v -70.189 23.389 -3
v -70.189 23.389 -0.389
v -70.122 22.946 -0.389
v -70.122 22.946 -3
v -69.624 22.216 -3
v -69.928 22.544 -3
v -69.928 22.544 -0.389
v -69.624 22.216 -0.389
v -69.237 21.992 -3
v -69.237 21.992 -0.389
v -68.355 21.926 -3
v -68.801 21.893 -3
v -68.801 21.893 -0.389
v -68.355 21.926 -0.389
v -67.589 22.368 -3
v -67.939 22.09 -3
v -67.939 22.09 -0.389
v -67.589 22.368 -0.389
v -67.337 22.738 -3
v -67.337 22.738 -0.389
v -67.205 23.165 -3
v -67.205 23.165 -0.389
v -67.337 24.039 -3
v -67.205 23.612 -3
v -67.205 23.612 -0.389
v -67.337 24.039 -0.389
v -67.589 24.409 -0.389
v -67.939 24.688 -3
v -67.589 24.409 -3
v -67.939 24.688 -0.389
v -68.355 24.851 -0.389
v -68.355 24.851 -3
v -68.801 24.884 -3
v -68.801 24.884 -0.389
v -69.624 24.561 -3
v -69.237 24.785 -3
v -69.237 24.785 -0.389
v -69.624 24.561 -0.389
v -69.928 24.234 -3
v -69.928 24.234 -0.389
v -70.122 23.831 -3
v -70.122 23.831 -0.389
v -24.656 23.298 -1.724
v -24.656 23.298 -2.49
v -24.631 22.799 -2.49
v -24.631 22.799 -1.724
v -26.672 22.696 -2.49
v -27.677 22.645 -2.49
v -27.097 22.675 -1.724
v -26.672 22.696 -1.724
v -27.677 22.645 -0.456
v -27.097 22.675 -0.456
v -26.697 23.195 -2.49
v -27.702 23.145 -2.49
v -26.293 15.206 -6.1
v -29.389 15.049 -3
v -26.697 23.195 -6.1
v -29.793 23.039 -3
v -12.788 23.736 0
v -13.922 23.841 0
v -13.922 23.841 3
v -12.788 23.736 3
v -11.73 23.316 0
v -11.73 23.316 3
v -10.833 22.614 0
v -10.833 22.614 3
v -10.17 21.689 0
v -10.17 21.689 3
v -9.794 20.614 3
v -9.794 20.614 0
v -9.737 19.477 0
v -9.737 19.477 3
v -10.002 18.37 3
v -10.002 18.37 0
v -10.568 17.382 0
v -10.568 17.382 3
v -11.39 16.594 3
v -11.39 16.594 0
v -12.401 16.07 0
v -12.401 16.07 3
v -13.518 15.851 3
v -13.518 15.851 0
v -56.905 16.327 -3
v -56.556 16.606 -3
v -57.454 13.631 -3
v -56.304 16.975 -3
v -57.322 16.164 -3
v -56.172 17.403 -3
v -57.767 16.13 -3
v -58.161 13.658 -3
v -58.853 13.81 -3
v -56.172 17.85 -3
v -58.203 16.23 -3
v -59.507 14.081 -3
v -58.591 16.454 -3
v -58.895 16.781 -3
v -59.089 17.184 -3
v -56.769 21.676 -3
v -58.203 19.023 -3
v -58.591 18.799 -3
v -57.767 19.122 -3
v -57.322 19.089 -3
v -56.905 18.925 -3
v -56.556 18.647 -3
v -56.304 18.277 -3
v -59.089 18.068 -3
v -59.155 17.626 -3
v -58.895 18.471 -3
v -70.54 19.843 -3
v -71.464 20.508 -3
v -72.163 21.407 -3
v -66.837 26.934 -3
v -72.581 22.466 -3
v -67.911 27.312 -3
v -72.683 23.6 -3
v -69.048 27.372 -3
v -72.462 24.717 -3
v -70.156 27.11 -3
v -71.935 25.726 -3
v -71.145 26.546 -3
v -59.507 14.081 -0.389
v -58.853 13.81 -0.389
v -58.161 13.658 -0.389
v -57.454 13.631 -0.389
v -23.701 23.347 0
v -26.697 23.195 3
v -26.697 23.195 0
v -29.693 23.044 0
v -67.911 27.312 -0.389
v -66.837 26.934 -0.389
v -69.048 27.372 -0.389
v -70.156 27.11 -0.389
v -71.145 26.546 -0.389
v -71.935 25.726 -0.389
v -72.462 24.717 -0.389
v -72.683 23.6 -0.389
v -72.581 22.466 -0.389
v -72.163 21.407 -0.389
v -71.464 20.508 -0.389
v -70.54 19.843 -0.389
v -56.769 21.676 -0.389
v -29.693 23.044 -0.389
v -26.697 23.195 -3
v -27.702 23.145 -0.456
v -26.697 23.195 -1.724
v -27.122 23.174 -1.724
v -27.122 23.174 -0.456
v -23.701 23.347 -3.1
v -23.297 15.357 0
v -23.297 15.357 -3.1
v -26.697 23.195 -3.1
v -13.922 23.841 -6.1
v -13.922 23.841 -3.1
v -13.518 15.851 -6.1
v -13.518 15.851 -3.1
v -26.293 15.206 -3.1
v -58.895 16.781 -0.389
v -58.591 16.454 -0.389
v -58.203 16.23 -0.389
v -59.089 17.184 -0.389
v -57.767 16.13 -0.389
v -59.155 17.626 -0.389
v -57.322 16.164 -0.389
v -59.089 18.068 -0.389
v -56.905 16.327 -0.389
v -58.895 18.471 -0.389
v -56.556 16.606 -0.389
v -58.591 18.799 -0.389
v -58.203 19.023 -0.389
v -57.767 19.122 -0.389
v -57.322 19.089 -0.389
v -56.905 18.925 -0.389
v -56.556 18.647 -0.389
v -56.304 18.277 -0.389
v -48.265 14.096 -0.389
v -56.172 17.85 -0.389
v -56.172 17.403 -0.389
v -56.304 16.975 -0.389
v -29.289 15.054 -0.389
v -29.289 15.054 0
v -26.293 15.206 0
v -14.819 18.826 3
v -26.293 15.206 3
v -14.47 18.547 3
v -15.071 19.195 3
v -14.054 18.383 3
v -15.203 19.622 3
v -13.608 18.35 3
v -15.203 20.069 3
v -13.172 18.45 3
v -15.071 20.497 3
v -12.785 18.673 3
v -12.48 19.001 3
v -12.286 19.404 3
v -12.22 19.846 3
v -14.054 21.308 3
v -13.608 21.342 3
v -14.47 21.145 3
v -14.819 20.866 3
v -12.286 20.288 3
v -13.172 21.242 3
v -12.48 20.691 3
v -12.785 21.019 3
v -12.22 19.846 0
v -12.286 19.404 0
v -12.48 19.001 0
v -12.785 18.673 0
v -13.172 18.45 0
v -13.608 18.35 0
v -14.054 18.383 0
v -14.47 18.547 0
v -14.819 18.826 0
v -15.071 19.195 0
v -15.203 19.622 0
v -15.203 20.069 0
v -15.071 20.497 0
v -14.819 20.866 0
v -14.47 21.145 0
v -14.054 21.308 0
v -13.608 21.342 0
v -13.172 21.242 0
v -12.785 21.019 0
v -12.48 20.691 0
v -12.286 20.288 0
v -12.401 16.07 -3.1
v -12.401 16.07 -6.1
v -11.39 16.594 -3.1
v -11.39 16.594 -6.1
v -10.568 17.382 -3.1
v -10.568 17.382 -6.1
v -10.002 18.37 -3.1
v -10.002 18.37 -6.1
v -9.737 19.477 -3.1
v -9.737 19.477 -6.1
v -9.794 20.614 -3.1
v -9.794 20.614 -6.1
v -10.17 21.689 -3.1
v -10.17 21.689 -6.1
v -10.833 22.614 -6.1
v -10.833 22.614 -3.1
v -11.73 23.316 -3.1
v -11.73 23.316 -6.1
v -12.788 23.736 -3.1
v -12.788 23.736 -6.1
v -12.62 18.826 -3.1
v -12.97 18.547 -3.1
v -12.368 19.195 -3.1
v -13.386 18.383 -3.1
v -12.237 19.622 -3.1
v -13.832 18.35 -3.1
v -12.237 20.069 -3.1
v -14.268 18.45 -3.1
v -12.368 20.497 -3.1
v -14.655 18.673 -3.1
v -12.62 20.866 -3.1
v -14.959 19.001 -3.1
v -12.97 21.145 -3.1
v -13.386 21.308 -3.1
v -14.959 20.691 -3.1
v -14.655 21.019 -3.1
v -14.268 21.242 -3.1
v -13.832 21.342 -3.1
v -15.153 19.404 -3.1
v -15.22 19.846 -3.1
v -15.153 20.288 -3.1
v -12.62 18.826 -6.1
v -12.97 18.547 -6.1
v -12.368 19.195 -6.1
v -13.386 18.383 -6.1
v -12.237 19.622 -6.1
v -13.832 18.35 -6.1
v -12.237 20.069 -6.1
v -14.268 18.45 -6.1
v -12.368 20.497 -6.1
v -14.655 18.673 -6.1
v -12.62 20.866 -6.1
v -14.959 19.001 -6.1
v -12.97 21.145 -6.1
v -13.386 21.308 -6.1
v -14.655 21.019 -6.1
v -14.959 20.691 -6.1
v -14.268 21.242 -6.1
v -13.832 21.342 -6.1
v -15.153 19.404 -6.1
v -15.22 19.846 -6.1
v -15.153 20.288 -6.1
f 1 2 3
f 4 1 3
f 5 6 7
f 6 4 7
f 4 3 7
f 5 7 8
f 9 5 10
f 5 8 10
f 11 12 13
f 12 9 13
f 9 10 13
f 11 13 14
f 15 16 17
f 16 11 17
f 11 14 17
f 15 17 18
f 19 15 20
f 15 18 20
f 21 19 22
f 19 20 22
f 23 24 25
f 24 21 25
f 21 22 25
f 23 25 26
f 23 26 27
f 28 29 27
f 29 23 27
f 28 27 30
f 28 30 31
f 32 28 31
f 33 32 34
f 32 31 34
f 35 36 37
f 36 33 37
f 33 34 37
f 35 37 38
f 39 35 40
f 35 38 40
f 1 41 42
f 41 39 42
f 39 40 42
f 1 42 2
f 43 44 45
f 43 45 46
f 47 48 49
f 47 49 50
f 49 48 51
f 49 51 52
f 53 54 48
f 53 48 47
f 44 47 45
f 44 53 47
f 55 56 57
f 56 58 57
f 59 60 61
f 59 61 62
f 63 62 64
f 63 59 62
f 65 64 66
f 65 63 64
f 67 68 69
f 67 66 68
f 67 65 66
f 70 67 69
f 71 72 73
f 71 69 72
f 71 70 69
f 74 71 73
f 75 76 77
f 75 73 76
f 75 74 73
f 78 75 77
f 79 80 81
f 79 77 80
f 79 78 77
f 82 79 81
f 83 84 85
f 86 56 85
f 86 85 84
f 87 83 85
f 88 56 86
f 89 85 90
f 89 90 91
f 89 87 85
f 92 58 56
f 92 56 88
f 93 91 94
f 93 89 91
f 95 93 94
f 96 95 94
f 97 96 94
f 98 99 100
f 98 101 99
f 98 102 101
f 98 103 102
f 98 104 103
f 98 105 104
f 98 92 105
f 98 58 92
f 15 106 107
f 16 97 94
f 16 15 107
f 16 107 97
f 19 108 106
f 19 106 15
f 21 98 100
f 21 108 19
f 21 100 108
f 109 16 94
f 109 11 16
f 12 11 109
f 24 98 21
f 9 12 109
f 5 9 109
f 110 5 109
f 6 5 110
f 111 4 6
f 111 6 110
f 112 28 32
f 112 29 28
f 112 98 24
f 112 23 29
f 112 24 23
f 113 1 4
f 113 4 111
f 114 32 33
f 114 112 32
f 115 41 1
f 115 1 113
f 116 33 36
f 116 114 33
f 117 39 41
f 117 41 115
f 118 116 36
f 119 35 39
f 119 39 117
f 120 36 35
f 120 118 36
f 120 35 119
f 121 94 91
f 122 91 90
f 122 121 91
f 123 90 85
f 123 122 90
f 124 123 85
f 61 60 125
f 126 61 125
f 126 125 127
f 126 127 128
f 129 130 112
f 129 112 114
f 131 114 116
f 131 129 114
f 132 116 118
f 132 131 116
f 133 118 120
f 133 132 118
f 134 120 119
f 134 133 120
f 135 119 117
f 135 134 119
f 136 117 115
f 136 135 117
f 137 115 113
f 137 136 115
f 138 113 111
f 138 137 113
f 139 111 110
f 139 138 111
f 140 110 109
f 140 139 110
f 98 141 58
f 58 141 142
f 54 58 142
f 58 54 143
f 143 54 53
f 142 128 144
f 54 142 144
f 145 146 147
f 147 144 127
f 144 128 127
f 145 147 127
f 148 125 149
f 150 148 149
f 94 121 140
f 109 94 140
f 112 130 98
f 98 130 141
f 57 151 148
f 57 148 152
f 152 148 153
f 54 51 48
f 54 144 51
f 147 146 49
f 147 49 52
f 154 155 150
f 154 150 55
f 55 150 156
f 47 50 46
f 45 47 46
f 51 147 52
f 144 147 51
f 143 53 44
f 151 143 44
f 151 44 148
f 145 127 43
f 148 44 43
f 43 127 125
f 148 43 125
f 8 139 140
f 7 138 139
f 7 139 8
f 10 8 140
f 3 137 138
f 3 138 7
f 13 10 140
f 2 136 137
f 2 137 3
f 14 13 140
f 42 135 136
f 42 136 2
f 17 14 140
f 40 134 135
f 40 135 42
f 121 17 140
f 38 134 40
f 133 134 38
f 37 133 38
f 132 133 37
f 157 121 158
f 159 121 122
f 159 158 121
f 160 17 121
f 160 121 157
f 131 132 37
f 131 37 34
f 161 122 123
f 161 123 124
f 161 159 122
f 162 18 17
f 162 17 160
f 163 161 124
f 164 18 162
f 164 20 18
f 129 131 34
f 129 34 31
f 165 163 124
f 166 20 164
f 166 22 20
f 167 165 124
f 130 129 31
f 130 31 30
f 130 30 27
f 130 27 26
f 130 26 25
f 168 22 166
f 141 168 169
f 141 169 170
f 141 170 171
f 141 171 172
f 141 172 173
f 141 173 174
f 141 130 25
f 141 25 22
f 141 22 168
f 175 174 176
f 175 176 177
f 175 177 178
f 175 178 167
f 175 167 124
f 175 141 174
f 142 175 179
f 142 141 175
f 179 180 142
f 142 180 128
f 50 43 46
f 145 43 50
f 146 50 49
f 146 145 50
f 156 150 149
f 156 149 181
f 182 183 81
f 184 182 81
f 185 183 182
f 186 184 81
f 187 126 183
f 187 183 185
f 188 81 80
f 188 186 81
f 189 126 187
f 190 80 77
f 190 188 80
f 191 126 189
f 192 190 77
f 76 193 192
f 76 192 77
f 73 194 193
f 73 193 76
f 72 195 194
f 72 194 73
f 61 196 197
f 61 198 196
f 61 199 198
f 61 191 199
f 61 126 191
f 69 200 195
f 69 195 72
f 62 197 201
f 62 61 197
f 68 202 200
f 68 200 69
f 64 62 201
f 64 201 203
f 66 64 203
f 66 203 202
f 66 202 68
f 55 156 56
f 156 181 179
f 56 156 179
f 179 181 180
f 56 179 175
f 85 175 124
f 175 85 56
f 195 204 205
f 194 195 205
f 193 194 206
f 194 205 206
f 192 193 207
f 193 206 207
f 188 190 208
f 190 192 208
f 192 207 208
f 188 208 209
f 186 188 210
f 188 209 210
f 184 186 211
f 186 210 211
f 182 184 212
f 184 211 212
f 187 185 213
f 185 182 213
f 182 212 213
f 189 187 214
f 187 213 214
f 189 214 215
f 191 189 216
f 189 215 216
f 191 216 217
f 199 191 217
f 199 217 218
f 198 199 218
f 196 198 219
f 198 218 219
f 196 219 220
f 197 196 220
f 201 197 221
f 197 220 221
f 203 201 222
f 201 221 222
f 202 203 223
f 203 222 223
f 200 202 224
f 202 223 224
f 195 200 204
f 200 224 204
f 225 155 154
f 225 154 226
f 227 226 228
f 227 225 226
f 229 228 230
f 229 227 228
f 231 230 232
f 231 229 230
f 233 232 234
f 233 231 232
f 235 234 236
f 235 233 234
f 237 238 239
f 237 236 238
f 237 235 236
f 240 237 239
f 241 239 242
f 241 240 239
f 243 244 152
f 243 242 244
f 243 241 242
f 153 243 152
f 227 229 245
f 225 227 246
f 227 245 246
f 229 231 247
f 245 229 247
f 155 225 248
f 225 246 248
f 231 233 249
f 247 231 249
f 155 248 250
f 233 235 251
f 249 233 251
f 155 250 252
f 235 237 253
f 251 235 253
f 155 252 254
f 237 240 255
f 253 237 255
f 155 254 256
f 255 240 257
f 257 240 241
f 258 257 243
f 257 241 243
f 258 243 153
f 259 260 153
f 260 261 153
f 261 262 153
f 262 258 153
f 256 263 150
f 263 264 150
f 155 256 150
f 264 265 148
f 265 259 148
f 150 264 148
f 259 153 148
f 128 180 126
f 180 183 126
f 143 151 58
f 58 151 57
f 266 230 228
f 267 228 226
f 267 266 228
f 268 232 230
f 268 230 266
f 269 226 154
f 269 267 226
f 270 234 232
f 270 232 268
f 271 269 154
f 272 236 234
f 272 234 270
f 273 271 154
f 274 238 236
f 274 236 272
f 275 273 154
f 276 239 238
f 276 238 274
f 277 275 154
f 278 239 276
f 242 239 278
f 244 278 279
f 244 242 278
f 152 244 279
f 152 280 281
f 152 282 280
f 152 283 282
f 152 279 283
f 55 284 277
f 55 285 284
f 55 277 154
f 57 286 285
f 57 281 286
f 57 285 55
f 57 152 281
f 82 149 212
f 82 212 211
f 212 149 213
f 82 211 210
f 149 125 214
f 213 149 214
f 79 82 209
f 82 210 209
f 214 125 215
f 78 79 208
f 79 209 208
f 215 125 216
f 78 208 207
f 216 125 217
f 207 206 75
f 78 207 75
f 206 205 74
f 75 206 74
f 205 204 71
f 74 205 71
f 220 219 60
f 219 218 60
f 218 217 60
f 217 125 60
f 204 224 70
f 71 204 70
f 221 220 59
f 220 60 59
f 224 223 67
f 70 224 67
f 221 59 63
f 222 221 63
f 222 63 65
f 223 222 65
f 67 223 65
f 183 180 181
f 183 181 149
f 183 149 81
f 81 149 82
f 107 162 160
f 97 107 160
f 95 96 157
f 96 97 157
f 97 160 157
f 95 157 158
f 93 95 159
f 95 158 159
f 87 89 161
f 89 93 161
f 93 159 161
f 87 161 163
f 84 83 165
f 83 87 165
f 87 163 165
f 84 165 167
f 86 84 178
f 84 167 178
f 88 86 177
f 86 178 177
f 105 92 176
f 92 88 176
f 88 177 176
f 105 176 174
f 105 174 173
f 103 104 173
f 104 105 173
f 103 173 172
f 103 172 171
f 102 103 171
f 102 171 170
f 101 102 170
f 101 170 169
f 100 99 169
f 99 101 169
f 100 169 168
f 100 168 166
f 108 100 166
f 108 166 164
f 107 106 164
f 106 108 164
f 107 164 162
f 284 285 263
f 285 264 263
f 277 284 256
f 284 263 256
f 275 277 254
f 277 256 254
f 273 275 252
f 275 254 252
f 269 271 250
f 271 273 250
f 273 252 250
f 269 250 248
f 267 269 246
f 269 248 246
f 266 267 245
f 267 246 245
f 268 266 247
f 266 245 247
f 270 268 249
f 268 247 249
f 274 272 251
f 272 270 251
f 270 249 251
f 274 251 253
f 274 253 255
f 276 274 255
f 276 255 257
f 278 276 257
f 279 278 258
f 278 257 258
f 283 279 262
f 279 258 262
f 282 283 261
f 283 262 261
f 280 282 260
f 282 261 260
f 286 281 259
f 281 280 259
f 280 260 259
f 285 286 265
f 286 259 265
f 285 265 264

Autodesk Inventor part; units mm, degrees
ref_plane "YZ Plane" through (0, 0, 0) normal (1, 0, 0) x (0, 1, 0)
ref_plane "XZ Plane" through (0, 0, 0) normal (0, 1, 0) x (-1, 0, 0)
sketch "Sketch1" plane through (0, 0, 0) normal (0, 0, 1) x (1, 0, 0)
  line L0 (-26.293304, 15.205533) -> (-26.696935, 23.195344)
  line L1 (-26.696935, 23.195344) -> (-13.921595, 23.840732)
  arc A0 (-13.517964, 15.85092) -> (-13.921595, 23.840732) centre (-13.719779, 19.845826) ccw
  line L2 (-13.517964, 15.85092) -> (-26.293304, 15.205533)
  circle A1 centre (-13.719779, 19.845826) radius 1.5
  point P0 (0, 0)
sketch "Sketch1 outline for Extrusion1" plane through (0, 0, 0) normal (0, 0, 1) x (1, 0, 0)
  arc A0 (-13.517964, 15.85092) -> (-13.921595, 23.840732) centre (-13.719779, 19.845826) ccw
  line L0 (-26.293304, 15.205533) -> (-13.517964, 15.85092)
  line L1 (-13.921595, 23.840732) -> (-26.696935, 23.195344)
  line L2 (-26.696935, 23.195344) -> (-26.293304, 15.205533)
  circle A1 centre (-13.719779, 19.845826) radius 1.5
extrude "Extrusion1" add sketch "Sketch1 outline for Extrusion1" along normal blind 3
sketch "Sketch2" plane through (0, 0, 0) normal (0, 0, -1) x (-1, 0, 0)
  line L0 (23.700756, 23.346705) -> (23.297124, 15.356894)
  line L1 (26.696935, 23.195344) -> (26.293304, 15.205533)
  line L2 (13.921595, 23.840732) -> (26.696935, 23.195344)
  arc A0 (13.921595, 23.840732) -> (13.517964, 15.85092) centre (13.719779, 19.845826) ccw
  line L3 (26.293304, 15.205533) -> (13.517964, 15.85092)
  line L4 (26.696935, 23.195344) -> (26.293304, 15.205533)
  circle A1 centre (13.719779, 19.845826) radius 1.5
  point P0 (0, 0)
sketch "Sketch2 outline for Extrusion2" plane through (0, 0, 0) normal (0, 0, -1) x (-1, 0, 0)
  line L0 (23.297124, 15.356894) -> (26.293304, 15.205533)
  line L1 (23.700756, 23.346705) -> (23.297124, 15.356894)
  line L2 (26.696935, 23.195344) -> (23.700756, 23.346705)
  line L3 (26.293304, 15.205533) -> (26.696935, 23.195344)
extrude "Extrusion2" add sketch "Sketch2 outline for Extrusion2" along normal blind 3.1
sketch "Sketch3" plane through (0, 0, -3.1) normal (0, 0, -1) x (-1, 0, 0)
  line L0 (13.921595, 23.840732) -> (26.696935, 23.195344)
  line L1 (26.696935, 23.195344) -> (26.293304, 15.205533)
  line L2 (26.293304, 15.205533) -> (13.517964, 15.85092)
  arc A0 (13.921595, 23.840732) -> (13.517964, 15.85092) centre (13.719779, 19.845826) ccw
  circle A1 centre (13.719779, 19.845826) radius 1.5
  point P0 (0, 0)
sketch "Sketch3 outline for Extrusion3" plane through (0, 0, -3.1) normal (0, 0, -1) x (-1, 0, 0)
  arc A0 (13.921595, 23.840732) -> (13.517964, 15.85092) centre (13.719779, 19.845826) ccw
  line L0 (26.696935, 23.195344) -> (13.921595, 23.840732)
  line L1 (13.517964, 15.85092) -> (26.293304, 15.205533)
  line L2 (26.293304, 15.205533) -> (26.696935, 23.195344)
  circle A1 centre (13.719779, 19.845826) radius 1.5
extrude "Extrusion3" add sketch "Sketch3 outline for Extrusion3" along normal blind 3
sketch "Sketch4" plane through (0, 0, 0) normal (0, 0, -1) x (-1, 0, 0)
  arc A0 (57.453567, 13.631371) -> (57.857198, 21.621182) centre (57.655383, 17.626276) ccw
  line L0 (57.453567, 13.631371) -> (29.389355, 15.049125)
  line L1 (29.792987, 23.038937) -> (29.389355, 15.049125)
  line L2 (29.792987, 23.038937) -> (57.857198, 21.621182)
  circle A1 centre (57.655383, 17.626276) radius 1.5
  line L3 (29.389355, 15.049125) -> (26.293304, 15.205533)
  line L4 (26.696935, 23.195344) -> (26.293304, 15.205533)
  line L5 (26.696935, 23.195344) -> (29.792987, 23.038937)
  line L6 (29.792987, 23.038937) -> (29.389355, 15.049125)
  circle A2 centre (68.688702, 23.388615) radius 1.5
  arc A3 (70.540437, 19.843043) -> (66.836967, 26.934186) centre (68.688702, 23.388615) ccw
  line L7 (59.507118, 14.080705) -> (70.540437, 19.843043)
  arc A4 (57.453567, 13.631371) -> (57.857198, 21.621182) centre (57.655383, 17.626276) ccw
  line L8 (56.769238, 21.676144) -> (66.836967, 26.934186)
  point P0 (0, 0)
  dimension "d18" = 8
sketch "Sketch4 outline for Extrusion4" plane through (0, 0, 0) normal (0, 0, -1) x (-1, 0, 0)
  line L0 (26.696935, 23.195344) -> (26.293304, 15.205533)
  line L1 (26.293304, 15.205533) -> (57.453567, 13.631371)
  arc A0 (57.453567, 13.631371) -> (59.507118, 14.080705) centre (57.655383, 17.626276) ccw
  line L2 (59.507118, 14.080705) -> (70.540437, 19.843043)
  arc A1 (70.540437, 19.843043) -> (66.836967, 26.934186) centre (68.688702, 23.388615) ccw
  line L3 (66.836967, 26.934186) -> (56.769238, 21.676144)
  line L4 (56.769238, 21.676144) -> (26.696935, 23.195344)
  circle A2 centre (57.655383, 17.626276) radius 1.5
  circle A3 centre (68.688702, 23.388615) radius 1.5
extrude "Extrusion4" add sketch "Sketch4 outline for Extrusion4" along normal blind 3
chamfer "Chamfer1" distance 3 angle 45 1 edges at (-26.4951, 19.2004, 0)
chamfer "Chamfer2" distance 3.1 angle 45 1 edges at (-26.4951, 19.2004, -3)
ref_plane "Work Plane1" through (-62.942605, 1.312432, -0.38873) normal (0, 0, -1) x (-0.0504539, 0.9987264, 0)
sketch "Sketch6" plane through (0, 0, 0) normal (0, 0, 1) x (1, 0, 0)
  line L0 (-57.453567, 13.631371) -> (-48.265284, 14.095547)
  arc A0 (-57.857198, 21.621182) -> (-57.453567, 13.631371) centre (-57.655383, 17.626276) ccw
  line L1 (-29.693114, 23.043982) -> (-57.857198, 21.621182)
  line L2 (-29.693114, 23.043982) -> (-48.265284, 14.095547)
  circle A1 centre (-57.655383, 17.626276) radius 1.5
  point P0 (0, 0)
sketch "Sketch6 outline for Extrusion5" plane through (0, 0, 0) normal (0, 0, 1) x (1, 0, 0)
  line L0 (-29.693114, 23.043982) -> (-57.857198, 21.621182)
  line L1 (-48.265284, 14.095547) -> (-29.693114, 23.043982)
  arc A0 (-57.857198, 21.621182) -> (-57.453567, 13.631371) centre (-57.655383, 17.626276) ccw
  line L2 (-57.453567, 13.631371) -> (-48.265284, 14.095547)
  circle A1 centre (-57.655383, 17.626276) radius 1.5
extrude "Extrusion5" cut sketch "Sketch6 outline for Extrusion5" against normal up to surface (0.38873 mm away)
sketch "Sketch7" plane through (-13.921595, 23.840732, 3) normal (-0.0504539, 0.9987264, 0) x (0.9987264, 0.0504539, 0)
  line L0 (-10.748057, 5.806776) -> (-10.748057, 3.406816) construction
  line L1 (-10.748057, 3.406816) -> (-13.798057, 3.406816) construction
  line L2 (-13.798057, 3.406816) -> (-13.798057, 5.806776) construction
  line L3 (-13.798057, 5.806776) -> (-10.748057, 5.806776) construction
  line L4 (-13.798057, 3.456249) -> (-13.798057, 5.490406)
  line L5 (-13.798057, 5.490406) -> (-10.748057, 5.490406)
  line L6 (-10.748057, 5.490406) -> (-10.748057, 4.724199)
  line L7 (-10.748057, 4.724199) -> (-13.217222, 4.724199)
  line L8 (-13.217222, 4.724199) -> (-13.217222, 3.456249)
  line L9 (-13.217222, 3.456249) -> (-13.798057, 3.456249)
  point P0 (12.701006, 3)
sketch "Sketch7 outline for Emboss1" plane through (-13.921595, 23.840732, 3) normal (-0.0504539, 0.9987264, 0) x (0.9987264, 0.0504539, 0)
  line L0 (-13.798057, 3.456249) -> (-13.798057, 5.490406)
  line L1 (-13.798057, 5.490406) -> (-10.748057, 5.490406)
  line L2 (-10.748057, 5.490406) -> (-10.748057, 4.724199)
  line L3 (-10.748057, 4.724199) -> (-13.217222, 4.724199)
  line L4 (-13.217222, 4.724199) -> (-13.217222, 3.456249)
  line L5 (-13.217222, 3.456249) -> (-13.798057, 3.456249)
emboss "Emboss1" sketch "Sketch7 outline for Emboss1" operation cut depth 0.5 direction (0.0504539, -0.9987264, 0)
sketch "Sketch8" plane through (0, 0, 0) normal (0, 0, 1) x (1, 0, 0)
  line L0 (-57.857198, 21.621182) -> (-56.769238, 21.676144)
  line L1 (-66.836967, 26.934186) -> (-56.769238, 21.676144)
  arc A0 (-66.836967, 26.934186) -> (-70.540437, 19.843043) centre (-68.688702, 23.388615) ccw
  line L2 (-59.507118, 14.080705) -> (-70.540437, 19.843043)
  arc A1 (-57.857198, 21.621182) -> (-59.507118, 14.080705) centre (-57.655383, 17.626276) ccw
  circle A2 centre (-68.688702, 23.388615) radius 1.5
  point P0 (0, 0)
sketch "Sketch8 outline for Extrusion6" plane through (0, 0, 0) normal (0, 0, 1) x (1, 0, 0)
  arc A0 (-59.507118, 14.080705) -> (-57.857198, 21.621182) centre (-57.655383, 17.626276) cw
  line L0 (-70.540437, 19.843043) -> (-59.507118, 14.080705)
  line L1 (-57.857198, 21.621182) -> (-56.769238, 21.676144)
  arc A1 (-66.836967, 26.934186) -> (-70.540437, 19.843043) centre (-68.688702, 23.388615) ccw
  line L2 (-56.769238, 21.676144) -> (-66.836967, 26.934186)
  circle A2 centre (-68.688702, 23.388615) radius 1.5
extrude "Extrusion6" cut sketch "Sketch8 outline for Extrusion6" against normal up to surface (0.38873 mm away)
sketch "Sketch9" plane through (0, 0, 0) normal (0, 0, 1) x (1, 0, 0)
  line L0 (-29.693114, 23.043982) -> (-48.265284, 14.095547)
  line L1 (-29.289483, 15.054171) -> (-48.265284, 14.095547)
  line L2 (-29.693114, 23.043982) -> (-29.289483, 15.054171)
  point P0 (0, 0)
sketch "Sketch9 outline for Extrusion7" plane through (0, 0, 0) normal (0, 0, 1) x (1, 0, 0)
  line L0 (-29.289483, 15.054171) -> (-29.693114, 23.043982)
  line L1 (-48.265284, 14.095547) -> (-29.289483, 15.054171)
  line L2 (-29.693114, 23.043982) -> (-48.265284, 14.095547)
extrude "Extrusion7" cut sketch "Sketch9 outline for Extrusion7" against normal up to surface (0.38873 mm away)
properties part number "GripperShaftLeft_3DPrint"
